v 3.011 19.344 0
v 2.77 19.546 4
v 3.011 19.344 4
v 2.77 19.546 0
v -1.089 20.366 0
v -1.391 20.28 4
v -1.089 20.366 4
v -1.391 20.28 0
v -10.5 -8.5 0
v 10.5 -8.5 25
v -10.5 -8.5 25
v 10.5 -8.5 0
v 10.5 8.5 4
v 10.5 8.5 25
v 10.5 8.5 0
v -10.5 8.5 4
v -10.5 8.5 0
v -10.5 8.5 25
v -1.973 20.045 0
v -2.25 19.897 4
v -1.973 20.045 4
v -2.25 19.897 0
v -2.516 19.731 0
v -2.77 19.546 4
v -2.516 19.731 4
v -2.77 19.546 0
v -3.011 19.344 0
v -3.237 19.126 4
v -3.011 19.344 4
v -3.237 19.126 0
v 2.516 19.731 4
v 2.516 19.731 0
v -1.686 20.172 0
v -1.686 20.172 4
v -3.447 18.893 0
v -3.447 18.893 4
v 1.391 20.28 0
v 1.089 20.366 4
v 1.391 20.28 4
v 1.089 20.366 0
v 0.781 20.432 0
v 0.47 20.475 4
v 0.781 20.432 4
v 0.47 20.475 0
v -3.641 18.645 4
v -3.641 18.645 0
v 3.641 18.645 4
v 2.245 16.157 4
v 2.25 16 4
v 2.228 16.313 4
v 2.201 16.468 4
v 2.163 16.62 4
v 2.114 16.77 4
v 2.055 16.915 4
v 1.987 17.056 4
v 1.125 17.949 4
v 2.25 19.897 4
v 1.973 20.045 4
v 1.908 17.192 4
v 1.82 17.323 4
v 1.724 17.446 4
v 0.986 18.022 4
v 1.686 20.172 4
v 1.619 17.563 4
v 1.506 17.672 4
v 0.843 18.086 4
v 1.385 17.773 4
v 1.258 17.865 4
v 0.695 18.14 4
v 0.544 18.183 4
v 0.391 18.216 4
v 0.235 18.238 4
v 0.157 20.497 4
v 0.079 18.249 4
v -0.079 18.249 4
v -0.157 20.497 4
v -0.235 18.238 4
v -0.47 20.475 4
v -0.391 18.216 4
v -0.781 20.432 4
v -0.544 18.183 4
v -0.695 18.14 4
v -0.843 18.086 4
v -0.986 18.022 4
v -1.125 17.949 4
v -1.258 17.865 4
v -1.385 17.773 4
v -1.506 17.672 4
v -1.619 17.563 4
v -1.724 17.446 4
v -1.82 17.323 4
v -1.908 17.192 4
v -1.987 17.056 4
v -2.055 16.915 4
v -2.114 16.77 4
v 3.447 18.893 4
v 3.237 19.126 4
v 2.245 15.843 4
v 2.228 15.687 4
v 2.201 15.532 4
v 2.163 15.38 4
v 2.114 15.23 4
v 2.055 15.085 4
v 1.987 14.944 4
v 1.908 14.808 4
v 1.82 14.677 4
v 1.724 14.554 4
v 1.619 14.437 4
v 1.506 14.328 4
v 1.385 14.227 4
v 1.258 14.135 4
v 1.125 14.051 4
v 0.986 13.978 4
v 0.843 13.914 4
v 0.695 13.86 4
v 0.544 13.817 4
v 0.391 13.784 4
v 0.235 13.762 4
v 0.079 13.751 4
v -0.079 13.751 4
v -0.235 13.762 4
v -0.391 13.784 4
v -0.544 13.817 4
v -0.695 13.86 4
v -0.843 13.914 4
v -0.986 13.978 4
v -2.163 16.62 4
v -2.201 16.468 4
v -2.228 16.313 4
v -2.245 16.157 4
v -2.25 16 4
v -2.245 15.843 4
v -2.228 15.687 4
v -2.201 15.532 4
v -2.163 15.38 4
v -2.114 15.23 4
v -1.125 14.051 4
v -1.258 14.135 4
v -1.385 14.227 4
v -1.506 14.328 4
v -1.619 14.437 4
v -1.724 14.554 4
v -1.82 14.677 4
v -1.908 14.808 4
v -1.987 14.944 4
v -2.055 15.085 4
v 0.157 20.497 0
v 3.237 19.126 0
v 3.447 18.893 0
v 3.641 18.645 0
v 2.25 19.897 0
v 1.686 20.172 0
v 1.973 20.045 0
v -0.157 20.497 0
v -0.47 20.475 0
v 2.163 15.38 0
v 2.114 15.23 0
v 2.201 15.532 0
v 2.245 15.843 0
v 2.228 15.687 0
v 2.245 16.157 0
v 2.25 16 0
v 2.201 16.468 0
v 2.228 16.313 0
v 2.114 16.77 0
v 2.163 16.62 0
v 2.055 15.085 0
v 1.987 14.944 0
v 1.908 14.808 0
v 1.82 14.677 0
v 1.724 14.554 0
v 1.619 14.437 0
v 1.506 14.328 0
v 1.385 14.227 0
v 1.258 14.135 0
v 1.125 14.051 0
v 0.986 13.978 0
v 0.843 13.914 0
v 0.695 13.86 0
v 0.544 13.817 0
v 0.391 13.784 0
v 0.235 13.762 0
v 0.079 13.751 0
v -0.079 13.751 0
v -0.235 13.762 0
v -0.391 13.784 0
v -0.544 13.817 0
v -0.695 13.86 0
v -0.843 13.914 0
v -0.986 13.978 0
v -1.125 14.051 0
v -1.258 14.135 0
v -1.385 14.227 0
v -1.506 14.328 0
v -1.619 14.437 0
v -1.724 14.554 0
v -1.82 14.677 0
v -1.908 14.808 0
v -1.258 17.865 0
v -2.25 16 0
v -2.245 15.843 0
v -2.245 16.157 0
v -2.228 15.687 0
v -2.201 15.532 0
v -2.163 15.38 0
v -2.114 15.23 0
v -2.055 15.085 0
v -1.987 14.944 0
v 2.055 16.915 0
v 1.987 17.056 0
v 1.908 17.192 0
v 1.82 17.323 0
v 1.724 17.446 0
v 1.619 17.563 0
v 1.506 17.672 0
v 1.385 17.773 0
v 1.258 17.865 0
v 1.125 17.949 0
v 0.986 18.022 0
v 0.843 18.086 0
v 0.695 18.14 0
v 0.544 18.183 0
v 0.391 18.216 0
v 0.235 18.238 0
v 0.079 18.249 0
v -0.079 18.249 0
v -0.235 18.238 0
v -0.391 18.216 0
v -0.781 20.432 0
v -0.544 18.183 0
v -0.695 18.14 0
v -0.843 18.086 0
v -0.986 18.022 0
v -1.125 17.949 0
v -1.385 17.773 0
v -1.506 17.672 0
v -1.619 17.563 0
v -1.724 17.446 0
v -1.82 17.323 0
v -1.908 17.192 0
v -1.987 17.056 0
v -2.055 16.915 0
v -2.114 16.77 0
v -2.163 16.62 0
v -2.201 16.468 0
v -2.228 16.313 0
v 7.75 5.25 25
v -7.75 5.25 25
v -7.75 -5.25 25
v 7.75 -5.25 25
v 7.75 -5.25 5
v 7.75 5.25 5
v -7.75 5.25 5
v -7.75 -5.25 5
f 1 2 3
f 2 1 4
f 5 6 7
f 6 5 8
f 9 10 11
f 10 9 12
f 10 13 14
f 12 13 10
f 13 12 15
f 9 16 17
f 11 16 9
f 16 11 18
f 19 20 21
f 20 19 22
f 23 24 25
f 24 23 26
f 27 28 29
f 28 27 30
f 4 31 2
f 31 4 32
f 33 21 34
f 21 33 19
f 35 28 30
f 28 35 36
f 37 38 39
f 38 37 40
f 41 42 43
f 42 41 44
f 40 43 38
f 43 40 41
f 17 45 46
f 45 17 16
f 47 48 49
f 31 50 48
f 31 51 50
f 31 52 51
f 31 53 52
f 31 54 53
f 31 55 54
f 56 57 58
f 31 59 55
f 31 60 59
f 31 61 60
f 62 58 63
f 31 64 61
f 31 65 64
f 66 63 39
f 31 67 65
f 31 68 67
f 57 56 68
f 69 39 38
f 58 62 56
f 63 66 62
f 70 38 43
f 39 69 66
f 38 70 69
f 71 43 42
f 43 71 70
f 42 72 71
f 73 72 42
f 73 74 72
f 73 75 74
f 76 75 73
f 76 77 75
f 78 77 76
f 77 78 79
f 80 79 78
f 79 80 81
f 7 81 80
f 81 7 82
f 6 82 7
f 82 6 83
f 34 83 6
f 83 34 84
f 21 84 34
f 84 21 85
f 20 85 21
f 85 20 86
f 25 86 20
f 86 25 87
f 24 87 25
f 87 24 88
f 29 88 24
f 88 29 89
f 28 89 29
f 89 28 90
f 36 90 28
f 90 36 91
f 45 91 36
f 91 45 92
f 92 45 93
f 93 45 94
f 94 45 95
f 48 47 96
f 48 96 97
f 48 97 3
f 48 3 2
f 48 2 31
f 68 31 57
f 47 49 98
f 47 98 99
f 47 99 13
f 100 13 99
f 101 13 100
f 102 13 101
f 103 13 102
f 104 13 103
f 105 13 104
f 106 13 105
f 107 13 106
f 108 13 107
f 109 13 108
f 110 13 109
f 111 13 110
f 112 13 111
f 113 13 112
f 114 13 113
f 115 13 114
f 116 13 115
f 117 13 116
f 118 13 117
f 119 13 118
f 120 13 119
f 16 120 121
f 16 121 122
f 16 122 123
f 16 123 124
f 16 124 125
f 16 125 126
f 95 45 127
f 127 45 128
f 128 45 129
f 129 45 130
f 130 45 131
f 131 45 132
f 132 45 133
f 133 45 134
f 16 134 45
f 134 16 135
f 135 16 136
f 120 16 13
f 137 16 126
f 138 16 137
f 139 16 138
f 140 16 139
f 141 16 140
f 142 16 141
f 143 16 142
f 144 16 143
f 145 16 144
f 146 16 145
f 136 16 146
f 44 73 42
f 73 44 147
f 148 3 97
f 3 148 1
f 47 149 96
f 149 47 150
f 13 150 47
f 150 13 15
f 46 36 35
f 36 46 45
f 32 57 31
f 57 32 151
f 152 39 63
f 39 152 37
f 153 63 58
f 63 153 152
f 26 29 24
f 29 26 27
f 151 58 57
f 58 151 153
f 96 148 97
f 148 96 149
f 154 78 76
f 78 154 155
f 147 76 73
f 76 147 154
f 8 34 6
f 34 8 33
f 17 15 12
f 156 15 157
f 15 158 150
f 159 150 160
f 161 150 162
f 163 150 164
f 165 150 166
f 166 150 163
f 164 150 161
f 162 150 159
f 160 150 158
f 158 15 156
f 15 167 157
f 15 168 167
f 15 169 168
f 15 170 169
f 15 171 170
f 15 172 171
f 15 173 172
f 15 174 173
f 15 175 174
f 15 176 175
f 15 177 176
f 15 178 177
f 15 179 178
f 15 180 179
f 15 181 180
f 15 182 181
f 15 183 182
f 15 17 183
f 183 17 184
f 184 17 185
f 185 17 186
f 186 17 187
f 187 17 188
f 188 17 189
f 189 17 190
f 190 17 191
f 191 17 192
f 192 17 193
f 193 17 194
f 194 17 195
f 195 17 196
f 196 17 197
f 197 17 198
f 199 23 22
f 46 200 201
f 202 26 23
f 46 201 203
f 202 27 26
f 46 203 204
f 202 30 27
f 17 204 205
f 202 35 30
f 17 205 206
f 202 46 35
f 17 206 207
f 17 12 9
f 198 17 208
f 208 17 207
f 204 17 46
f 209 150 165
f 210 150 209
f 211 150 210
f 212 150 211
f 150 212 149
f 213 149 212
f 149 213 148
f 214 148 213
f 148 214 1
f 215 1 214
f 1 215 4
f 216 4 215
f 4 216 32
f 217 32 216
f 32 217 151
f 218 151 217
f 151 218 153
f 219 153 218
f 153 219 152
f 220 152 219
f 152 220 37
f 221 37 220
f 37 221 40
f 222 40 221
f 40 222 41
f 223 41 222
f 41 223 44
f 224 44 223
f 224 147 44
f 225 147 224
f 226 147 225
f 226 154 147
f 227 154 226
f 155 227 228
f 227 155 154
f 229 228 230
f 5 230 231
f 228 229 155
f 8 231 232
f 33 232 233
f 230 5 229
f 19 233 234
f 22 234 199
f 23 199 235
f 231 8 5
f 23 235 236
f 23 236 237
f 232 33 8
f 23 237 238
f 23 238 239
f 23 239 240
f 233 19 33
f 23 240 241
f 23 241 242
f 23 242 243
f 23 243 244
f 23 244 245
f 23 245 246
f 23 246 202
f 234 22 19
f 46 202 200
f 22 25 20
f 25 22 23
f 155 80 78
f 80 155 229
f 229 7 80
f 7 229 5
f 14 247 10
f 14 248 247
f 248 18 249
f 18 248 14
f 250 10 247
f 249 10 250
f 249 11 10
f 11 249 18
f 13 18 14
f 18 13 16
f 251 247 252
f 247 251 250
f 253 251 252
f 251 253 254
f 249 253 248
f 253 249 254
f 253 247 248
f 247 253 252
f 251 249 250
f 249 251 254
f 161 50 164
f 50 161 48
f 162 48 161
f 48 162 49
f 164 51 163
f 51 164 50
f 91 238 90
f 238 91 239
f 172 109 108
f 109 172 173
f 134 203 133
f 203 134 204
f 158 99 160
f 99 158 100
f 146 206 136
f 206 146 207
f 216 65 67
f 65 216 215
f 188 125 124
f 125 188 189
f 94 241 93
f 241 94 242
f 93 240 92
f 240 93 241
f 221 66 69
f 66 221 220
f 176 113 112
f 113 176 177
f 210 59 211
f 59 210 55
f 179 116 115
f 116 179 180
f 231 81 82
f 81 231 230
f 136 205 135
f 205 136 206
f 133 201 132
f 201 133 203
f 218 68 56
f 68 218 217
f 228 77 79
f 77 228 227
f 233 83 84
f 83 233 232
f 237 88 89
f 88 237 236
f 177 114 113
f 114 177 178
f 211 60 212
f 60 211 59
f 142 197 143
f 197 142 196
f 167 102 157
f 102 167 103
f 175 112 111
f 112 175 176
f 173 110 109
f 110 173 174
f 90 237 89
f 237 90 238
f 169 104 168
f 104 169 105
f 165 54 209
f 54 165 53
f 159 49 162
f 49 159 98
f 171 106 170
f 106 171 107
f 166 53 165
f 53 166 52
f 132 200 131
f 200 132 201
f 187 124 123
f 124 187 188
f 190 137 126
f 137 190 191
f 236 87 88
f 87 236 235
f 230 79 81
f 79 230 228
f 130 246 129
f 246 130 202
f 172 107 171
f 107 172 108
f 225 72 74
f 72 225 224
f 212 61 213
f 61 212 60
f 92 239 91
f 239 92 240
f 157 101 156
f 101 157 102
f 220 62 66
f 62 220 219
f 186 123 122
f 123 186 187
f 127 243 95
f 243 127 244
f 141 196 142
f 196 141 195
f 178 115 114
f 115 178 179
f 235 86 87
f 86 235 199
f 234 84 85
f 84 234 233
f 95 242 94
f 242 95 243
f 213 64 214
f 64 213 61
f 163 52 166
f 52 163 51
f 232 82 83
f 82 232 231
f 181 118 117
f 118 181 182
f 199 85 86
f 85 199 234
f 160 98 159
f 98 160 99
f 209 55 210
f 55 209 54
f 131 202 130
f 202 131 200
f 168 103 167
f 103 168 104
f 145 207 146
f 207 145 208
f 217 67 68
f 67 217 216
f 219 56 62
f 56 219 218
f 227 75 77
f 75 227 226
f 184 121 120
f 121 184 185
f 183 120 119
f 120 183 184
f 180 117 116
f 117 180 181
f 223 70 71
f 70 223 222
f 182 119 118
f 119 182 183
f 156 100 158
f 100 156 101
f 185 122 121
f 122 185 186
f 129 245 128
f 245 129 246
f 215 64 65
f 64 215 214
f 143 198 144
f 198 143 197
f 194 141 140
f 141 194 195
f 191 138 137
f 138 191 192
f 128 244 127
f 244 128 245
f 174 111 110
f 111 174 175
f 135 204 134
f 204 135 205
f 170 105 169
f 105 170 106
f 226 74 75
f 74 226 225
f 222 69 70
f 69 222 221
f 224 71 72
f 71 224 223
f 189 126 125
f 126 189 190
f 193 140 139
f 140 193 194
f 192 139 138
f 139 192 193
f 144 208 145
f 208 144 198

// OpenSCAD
/*translate([0,56,-5])cylinder(d1=109, d2 = 121, h = 80, $fn = 90);
hull(){
translate([0,2,12.5])cube([25,30,25],center = true);
translate([0,50,12.5])cube([108,1,25],center = true);
}
translate([0,-6,15])cube([15.5,10,33],center = true);
*/

color("red")difference(){
union(){
hull(){
translate([0,0,2])cube([21,17,4],center = true);
translate([0,16,0])cylinder(d=9, h = 4, $fn = 90);}
translate([0,0,12.5])cube([21,17,25],center = true);
}
translate([0,0,17.5])cube([15.5,10.5,25],center = true);
translate([0,16,-15])cylinder(d=4.5, h = 33, $fn = 90);}
